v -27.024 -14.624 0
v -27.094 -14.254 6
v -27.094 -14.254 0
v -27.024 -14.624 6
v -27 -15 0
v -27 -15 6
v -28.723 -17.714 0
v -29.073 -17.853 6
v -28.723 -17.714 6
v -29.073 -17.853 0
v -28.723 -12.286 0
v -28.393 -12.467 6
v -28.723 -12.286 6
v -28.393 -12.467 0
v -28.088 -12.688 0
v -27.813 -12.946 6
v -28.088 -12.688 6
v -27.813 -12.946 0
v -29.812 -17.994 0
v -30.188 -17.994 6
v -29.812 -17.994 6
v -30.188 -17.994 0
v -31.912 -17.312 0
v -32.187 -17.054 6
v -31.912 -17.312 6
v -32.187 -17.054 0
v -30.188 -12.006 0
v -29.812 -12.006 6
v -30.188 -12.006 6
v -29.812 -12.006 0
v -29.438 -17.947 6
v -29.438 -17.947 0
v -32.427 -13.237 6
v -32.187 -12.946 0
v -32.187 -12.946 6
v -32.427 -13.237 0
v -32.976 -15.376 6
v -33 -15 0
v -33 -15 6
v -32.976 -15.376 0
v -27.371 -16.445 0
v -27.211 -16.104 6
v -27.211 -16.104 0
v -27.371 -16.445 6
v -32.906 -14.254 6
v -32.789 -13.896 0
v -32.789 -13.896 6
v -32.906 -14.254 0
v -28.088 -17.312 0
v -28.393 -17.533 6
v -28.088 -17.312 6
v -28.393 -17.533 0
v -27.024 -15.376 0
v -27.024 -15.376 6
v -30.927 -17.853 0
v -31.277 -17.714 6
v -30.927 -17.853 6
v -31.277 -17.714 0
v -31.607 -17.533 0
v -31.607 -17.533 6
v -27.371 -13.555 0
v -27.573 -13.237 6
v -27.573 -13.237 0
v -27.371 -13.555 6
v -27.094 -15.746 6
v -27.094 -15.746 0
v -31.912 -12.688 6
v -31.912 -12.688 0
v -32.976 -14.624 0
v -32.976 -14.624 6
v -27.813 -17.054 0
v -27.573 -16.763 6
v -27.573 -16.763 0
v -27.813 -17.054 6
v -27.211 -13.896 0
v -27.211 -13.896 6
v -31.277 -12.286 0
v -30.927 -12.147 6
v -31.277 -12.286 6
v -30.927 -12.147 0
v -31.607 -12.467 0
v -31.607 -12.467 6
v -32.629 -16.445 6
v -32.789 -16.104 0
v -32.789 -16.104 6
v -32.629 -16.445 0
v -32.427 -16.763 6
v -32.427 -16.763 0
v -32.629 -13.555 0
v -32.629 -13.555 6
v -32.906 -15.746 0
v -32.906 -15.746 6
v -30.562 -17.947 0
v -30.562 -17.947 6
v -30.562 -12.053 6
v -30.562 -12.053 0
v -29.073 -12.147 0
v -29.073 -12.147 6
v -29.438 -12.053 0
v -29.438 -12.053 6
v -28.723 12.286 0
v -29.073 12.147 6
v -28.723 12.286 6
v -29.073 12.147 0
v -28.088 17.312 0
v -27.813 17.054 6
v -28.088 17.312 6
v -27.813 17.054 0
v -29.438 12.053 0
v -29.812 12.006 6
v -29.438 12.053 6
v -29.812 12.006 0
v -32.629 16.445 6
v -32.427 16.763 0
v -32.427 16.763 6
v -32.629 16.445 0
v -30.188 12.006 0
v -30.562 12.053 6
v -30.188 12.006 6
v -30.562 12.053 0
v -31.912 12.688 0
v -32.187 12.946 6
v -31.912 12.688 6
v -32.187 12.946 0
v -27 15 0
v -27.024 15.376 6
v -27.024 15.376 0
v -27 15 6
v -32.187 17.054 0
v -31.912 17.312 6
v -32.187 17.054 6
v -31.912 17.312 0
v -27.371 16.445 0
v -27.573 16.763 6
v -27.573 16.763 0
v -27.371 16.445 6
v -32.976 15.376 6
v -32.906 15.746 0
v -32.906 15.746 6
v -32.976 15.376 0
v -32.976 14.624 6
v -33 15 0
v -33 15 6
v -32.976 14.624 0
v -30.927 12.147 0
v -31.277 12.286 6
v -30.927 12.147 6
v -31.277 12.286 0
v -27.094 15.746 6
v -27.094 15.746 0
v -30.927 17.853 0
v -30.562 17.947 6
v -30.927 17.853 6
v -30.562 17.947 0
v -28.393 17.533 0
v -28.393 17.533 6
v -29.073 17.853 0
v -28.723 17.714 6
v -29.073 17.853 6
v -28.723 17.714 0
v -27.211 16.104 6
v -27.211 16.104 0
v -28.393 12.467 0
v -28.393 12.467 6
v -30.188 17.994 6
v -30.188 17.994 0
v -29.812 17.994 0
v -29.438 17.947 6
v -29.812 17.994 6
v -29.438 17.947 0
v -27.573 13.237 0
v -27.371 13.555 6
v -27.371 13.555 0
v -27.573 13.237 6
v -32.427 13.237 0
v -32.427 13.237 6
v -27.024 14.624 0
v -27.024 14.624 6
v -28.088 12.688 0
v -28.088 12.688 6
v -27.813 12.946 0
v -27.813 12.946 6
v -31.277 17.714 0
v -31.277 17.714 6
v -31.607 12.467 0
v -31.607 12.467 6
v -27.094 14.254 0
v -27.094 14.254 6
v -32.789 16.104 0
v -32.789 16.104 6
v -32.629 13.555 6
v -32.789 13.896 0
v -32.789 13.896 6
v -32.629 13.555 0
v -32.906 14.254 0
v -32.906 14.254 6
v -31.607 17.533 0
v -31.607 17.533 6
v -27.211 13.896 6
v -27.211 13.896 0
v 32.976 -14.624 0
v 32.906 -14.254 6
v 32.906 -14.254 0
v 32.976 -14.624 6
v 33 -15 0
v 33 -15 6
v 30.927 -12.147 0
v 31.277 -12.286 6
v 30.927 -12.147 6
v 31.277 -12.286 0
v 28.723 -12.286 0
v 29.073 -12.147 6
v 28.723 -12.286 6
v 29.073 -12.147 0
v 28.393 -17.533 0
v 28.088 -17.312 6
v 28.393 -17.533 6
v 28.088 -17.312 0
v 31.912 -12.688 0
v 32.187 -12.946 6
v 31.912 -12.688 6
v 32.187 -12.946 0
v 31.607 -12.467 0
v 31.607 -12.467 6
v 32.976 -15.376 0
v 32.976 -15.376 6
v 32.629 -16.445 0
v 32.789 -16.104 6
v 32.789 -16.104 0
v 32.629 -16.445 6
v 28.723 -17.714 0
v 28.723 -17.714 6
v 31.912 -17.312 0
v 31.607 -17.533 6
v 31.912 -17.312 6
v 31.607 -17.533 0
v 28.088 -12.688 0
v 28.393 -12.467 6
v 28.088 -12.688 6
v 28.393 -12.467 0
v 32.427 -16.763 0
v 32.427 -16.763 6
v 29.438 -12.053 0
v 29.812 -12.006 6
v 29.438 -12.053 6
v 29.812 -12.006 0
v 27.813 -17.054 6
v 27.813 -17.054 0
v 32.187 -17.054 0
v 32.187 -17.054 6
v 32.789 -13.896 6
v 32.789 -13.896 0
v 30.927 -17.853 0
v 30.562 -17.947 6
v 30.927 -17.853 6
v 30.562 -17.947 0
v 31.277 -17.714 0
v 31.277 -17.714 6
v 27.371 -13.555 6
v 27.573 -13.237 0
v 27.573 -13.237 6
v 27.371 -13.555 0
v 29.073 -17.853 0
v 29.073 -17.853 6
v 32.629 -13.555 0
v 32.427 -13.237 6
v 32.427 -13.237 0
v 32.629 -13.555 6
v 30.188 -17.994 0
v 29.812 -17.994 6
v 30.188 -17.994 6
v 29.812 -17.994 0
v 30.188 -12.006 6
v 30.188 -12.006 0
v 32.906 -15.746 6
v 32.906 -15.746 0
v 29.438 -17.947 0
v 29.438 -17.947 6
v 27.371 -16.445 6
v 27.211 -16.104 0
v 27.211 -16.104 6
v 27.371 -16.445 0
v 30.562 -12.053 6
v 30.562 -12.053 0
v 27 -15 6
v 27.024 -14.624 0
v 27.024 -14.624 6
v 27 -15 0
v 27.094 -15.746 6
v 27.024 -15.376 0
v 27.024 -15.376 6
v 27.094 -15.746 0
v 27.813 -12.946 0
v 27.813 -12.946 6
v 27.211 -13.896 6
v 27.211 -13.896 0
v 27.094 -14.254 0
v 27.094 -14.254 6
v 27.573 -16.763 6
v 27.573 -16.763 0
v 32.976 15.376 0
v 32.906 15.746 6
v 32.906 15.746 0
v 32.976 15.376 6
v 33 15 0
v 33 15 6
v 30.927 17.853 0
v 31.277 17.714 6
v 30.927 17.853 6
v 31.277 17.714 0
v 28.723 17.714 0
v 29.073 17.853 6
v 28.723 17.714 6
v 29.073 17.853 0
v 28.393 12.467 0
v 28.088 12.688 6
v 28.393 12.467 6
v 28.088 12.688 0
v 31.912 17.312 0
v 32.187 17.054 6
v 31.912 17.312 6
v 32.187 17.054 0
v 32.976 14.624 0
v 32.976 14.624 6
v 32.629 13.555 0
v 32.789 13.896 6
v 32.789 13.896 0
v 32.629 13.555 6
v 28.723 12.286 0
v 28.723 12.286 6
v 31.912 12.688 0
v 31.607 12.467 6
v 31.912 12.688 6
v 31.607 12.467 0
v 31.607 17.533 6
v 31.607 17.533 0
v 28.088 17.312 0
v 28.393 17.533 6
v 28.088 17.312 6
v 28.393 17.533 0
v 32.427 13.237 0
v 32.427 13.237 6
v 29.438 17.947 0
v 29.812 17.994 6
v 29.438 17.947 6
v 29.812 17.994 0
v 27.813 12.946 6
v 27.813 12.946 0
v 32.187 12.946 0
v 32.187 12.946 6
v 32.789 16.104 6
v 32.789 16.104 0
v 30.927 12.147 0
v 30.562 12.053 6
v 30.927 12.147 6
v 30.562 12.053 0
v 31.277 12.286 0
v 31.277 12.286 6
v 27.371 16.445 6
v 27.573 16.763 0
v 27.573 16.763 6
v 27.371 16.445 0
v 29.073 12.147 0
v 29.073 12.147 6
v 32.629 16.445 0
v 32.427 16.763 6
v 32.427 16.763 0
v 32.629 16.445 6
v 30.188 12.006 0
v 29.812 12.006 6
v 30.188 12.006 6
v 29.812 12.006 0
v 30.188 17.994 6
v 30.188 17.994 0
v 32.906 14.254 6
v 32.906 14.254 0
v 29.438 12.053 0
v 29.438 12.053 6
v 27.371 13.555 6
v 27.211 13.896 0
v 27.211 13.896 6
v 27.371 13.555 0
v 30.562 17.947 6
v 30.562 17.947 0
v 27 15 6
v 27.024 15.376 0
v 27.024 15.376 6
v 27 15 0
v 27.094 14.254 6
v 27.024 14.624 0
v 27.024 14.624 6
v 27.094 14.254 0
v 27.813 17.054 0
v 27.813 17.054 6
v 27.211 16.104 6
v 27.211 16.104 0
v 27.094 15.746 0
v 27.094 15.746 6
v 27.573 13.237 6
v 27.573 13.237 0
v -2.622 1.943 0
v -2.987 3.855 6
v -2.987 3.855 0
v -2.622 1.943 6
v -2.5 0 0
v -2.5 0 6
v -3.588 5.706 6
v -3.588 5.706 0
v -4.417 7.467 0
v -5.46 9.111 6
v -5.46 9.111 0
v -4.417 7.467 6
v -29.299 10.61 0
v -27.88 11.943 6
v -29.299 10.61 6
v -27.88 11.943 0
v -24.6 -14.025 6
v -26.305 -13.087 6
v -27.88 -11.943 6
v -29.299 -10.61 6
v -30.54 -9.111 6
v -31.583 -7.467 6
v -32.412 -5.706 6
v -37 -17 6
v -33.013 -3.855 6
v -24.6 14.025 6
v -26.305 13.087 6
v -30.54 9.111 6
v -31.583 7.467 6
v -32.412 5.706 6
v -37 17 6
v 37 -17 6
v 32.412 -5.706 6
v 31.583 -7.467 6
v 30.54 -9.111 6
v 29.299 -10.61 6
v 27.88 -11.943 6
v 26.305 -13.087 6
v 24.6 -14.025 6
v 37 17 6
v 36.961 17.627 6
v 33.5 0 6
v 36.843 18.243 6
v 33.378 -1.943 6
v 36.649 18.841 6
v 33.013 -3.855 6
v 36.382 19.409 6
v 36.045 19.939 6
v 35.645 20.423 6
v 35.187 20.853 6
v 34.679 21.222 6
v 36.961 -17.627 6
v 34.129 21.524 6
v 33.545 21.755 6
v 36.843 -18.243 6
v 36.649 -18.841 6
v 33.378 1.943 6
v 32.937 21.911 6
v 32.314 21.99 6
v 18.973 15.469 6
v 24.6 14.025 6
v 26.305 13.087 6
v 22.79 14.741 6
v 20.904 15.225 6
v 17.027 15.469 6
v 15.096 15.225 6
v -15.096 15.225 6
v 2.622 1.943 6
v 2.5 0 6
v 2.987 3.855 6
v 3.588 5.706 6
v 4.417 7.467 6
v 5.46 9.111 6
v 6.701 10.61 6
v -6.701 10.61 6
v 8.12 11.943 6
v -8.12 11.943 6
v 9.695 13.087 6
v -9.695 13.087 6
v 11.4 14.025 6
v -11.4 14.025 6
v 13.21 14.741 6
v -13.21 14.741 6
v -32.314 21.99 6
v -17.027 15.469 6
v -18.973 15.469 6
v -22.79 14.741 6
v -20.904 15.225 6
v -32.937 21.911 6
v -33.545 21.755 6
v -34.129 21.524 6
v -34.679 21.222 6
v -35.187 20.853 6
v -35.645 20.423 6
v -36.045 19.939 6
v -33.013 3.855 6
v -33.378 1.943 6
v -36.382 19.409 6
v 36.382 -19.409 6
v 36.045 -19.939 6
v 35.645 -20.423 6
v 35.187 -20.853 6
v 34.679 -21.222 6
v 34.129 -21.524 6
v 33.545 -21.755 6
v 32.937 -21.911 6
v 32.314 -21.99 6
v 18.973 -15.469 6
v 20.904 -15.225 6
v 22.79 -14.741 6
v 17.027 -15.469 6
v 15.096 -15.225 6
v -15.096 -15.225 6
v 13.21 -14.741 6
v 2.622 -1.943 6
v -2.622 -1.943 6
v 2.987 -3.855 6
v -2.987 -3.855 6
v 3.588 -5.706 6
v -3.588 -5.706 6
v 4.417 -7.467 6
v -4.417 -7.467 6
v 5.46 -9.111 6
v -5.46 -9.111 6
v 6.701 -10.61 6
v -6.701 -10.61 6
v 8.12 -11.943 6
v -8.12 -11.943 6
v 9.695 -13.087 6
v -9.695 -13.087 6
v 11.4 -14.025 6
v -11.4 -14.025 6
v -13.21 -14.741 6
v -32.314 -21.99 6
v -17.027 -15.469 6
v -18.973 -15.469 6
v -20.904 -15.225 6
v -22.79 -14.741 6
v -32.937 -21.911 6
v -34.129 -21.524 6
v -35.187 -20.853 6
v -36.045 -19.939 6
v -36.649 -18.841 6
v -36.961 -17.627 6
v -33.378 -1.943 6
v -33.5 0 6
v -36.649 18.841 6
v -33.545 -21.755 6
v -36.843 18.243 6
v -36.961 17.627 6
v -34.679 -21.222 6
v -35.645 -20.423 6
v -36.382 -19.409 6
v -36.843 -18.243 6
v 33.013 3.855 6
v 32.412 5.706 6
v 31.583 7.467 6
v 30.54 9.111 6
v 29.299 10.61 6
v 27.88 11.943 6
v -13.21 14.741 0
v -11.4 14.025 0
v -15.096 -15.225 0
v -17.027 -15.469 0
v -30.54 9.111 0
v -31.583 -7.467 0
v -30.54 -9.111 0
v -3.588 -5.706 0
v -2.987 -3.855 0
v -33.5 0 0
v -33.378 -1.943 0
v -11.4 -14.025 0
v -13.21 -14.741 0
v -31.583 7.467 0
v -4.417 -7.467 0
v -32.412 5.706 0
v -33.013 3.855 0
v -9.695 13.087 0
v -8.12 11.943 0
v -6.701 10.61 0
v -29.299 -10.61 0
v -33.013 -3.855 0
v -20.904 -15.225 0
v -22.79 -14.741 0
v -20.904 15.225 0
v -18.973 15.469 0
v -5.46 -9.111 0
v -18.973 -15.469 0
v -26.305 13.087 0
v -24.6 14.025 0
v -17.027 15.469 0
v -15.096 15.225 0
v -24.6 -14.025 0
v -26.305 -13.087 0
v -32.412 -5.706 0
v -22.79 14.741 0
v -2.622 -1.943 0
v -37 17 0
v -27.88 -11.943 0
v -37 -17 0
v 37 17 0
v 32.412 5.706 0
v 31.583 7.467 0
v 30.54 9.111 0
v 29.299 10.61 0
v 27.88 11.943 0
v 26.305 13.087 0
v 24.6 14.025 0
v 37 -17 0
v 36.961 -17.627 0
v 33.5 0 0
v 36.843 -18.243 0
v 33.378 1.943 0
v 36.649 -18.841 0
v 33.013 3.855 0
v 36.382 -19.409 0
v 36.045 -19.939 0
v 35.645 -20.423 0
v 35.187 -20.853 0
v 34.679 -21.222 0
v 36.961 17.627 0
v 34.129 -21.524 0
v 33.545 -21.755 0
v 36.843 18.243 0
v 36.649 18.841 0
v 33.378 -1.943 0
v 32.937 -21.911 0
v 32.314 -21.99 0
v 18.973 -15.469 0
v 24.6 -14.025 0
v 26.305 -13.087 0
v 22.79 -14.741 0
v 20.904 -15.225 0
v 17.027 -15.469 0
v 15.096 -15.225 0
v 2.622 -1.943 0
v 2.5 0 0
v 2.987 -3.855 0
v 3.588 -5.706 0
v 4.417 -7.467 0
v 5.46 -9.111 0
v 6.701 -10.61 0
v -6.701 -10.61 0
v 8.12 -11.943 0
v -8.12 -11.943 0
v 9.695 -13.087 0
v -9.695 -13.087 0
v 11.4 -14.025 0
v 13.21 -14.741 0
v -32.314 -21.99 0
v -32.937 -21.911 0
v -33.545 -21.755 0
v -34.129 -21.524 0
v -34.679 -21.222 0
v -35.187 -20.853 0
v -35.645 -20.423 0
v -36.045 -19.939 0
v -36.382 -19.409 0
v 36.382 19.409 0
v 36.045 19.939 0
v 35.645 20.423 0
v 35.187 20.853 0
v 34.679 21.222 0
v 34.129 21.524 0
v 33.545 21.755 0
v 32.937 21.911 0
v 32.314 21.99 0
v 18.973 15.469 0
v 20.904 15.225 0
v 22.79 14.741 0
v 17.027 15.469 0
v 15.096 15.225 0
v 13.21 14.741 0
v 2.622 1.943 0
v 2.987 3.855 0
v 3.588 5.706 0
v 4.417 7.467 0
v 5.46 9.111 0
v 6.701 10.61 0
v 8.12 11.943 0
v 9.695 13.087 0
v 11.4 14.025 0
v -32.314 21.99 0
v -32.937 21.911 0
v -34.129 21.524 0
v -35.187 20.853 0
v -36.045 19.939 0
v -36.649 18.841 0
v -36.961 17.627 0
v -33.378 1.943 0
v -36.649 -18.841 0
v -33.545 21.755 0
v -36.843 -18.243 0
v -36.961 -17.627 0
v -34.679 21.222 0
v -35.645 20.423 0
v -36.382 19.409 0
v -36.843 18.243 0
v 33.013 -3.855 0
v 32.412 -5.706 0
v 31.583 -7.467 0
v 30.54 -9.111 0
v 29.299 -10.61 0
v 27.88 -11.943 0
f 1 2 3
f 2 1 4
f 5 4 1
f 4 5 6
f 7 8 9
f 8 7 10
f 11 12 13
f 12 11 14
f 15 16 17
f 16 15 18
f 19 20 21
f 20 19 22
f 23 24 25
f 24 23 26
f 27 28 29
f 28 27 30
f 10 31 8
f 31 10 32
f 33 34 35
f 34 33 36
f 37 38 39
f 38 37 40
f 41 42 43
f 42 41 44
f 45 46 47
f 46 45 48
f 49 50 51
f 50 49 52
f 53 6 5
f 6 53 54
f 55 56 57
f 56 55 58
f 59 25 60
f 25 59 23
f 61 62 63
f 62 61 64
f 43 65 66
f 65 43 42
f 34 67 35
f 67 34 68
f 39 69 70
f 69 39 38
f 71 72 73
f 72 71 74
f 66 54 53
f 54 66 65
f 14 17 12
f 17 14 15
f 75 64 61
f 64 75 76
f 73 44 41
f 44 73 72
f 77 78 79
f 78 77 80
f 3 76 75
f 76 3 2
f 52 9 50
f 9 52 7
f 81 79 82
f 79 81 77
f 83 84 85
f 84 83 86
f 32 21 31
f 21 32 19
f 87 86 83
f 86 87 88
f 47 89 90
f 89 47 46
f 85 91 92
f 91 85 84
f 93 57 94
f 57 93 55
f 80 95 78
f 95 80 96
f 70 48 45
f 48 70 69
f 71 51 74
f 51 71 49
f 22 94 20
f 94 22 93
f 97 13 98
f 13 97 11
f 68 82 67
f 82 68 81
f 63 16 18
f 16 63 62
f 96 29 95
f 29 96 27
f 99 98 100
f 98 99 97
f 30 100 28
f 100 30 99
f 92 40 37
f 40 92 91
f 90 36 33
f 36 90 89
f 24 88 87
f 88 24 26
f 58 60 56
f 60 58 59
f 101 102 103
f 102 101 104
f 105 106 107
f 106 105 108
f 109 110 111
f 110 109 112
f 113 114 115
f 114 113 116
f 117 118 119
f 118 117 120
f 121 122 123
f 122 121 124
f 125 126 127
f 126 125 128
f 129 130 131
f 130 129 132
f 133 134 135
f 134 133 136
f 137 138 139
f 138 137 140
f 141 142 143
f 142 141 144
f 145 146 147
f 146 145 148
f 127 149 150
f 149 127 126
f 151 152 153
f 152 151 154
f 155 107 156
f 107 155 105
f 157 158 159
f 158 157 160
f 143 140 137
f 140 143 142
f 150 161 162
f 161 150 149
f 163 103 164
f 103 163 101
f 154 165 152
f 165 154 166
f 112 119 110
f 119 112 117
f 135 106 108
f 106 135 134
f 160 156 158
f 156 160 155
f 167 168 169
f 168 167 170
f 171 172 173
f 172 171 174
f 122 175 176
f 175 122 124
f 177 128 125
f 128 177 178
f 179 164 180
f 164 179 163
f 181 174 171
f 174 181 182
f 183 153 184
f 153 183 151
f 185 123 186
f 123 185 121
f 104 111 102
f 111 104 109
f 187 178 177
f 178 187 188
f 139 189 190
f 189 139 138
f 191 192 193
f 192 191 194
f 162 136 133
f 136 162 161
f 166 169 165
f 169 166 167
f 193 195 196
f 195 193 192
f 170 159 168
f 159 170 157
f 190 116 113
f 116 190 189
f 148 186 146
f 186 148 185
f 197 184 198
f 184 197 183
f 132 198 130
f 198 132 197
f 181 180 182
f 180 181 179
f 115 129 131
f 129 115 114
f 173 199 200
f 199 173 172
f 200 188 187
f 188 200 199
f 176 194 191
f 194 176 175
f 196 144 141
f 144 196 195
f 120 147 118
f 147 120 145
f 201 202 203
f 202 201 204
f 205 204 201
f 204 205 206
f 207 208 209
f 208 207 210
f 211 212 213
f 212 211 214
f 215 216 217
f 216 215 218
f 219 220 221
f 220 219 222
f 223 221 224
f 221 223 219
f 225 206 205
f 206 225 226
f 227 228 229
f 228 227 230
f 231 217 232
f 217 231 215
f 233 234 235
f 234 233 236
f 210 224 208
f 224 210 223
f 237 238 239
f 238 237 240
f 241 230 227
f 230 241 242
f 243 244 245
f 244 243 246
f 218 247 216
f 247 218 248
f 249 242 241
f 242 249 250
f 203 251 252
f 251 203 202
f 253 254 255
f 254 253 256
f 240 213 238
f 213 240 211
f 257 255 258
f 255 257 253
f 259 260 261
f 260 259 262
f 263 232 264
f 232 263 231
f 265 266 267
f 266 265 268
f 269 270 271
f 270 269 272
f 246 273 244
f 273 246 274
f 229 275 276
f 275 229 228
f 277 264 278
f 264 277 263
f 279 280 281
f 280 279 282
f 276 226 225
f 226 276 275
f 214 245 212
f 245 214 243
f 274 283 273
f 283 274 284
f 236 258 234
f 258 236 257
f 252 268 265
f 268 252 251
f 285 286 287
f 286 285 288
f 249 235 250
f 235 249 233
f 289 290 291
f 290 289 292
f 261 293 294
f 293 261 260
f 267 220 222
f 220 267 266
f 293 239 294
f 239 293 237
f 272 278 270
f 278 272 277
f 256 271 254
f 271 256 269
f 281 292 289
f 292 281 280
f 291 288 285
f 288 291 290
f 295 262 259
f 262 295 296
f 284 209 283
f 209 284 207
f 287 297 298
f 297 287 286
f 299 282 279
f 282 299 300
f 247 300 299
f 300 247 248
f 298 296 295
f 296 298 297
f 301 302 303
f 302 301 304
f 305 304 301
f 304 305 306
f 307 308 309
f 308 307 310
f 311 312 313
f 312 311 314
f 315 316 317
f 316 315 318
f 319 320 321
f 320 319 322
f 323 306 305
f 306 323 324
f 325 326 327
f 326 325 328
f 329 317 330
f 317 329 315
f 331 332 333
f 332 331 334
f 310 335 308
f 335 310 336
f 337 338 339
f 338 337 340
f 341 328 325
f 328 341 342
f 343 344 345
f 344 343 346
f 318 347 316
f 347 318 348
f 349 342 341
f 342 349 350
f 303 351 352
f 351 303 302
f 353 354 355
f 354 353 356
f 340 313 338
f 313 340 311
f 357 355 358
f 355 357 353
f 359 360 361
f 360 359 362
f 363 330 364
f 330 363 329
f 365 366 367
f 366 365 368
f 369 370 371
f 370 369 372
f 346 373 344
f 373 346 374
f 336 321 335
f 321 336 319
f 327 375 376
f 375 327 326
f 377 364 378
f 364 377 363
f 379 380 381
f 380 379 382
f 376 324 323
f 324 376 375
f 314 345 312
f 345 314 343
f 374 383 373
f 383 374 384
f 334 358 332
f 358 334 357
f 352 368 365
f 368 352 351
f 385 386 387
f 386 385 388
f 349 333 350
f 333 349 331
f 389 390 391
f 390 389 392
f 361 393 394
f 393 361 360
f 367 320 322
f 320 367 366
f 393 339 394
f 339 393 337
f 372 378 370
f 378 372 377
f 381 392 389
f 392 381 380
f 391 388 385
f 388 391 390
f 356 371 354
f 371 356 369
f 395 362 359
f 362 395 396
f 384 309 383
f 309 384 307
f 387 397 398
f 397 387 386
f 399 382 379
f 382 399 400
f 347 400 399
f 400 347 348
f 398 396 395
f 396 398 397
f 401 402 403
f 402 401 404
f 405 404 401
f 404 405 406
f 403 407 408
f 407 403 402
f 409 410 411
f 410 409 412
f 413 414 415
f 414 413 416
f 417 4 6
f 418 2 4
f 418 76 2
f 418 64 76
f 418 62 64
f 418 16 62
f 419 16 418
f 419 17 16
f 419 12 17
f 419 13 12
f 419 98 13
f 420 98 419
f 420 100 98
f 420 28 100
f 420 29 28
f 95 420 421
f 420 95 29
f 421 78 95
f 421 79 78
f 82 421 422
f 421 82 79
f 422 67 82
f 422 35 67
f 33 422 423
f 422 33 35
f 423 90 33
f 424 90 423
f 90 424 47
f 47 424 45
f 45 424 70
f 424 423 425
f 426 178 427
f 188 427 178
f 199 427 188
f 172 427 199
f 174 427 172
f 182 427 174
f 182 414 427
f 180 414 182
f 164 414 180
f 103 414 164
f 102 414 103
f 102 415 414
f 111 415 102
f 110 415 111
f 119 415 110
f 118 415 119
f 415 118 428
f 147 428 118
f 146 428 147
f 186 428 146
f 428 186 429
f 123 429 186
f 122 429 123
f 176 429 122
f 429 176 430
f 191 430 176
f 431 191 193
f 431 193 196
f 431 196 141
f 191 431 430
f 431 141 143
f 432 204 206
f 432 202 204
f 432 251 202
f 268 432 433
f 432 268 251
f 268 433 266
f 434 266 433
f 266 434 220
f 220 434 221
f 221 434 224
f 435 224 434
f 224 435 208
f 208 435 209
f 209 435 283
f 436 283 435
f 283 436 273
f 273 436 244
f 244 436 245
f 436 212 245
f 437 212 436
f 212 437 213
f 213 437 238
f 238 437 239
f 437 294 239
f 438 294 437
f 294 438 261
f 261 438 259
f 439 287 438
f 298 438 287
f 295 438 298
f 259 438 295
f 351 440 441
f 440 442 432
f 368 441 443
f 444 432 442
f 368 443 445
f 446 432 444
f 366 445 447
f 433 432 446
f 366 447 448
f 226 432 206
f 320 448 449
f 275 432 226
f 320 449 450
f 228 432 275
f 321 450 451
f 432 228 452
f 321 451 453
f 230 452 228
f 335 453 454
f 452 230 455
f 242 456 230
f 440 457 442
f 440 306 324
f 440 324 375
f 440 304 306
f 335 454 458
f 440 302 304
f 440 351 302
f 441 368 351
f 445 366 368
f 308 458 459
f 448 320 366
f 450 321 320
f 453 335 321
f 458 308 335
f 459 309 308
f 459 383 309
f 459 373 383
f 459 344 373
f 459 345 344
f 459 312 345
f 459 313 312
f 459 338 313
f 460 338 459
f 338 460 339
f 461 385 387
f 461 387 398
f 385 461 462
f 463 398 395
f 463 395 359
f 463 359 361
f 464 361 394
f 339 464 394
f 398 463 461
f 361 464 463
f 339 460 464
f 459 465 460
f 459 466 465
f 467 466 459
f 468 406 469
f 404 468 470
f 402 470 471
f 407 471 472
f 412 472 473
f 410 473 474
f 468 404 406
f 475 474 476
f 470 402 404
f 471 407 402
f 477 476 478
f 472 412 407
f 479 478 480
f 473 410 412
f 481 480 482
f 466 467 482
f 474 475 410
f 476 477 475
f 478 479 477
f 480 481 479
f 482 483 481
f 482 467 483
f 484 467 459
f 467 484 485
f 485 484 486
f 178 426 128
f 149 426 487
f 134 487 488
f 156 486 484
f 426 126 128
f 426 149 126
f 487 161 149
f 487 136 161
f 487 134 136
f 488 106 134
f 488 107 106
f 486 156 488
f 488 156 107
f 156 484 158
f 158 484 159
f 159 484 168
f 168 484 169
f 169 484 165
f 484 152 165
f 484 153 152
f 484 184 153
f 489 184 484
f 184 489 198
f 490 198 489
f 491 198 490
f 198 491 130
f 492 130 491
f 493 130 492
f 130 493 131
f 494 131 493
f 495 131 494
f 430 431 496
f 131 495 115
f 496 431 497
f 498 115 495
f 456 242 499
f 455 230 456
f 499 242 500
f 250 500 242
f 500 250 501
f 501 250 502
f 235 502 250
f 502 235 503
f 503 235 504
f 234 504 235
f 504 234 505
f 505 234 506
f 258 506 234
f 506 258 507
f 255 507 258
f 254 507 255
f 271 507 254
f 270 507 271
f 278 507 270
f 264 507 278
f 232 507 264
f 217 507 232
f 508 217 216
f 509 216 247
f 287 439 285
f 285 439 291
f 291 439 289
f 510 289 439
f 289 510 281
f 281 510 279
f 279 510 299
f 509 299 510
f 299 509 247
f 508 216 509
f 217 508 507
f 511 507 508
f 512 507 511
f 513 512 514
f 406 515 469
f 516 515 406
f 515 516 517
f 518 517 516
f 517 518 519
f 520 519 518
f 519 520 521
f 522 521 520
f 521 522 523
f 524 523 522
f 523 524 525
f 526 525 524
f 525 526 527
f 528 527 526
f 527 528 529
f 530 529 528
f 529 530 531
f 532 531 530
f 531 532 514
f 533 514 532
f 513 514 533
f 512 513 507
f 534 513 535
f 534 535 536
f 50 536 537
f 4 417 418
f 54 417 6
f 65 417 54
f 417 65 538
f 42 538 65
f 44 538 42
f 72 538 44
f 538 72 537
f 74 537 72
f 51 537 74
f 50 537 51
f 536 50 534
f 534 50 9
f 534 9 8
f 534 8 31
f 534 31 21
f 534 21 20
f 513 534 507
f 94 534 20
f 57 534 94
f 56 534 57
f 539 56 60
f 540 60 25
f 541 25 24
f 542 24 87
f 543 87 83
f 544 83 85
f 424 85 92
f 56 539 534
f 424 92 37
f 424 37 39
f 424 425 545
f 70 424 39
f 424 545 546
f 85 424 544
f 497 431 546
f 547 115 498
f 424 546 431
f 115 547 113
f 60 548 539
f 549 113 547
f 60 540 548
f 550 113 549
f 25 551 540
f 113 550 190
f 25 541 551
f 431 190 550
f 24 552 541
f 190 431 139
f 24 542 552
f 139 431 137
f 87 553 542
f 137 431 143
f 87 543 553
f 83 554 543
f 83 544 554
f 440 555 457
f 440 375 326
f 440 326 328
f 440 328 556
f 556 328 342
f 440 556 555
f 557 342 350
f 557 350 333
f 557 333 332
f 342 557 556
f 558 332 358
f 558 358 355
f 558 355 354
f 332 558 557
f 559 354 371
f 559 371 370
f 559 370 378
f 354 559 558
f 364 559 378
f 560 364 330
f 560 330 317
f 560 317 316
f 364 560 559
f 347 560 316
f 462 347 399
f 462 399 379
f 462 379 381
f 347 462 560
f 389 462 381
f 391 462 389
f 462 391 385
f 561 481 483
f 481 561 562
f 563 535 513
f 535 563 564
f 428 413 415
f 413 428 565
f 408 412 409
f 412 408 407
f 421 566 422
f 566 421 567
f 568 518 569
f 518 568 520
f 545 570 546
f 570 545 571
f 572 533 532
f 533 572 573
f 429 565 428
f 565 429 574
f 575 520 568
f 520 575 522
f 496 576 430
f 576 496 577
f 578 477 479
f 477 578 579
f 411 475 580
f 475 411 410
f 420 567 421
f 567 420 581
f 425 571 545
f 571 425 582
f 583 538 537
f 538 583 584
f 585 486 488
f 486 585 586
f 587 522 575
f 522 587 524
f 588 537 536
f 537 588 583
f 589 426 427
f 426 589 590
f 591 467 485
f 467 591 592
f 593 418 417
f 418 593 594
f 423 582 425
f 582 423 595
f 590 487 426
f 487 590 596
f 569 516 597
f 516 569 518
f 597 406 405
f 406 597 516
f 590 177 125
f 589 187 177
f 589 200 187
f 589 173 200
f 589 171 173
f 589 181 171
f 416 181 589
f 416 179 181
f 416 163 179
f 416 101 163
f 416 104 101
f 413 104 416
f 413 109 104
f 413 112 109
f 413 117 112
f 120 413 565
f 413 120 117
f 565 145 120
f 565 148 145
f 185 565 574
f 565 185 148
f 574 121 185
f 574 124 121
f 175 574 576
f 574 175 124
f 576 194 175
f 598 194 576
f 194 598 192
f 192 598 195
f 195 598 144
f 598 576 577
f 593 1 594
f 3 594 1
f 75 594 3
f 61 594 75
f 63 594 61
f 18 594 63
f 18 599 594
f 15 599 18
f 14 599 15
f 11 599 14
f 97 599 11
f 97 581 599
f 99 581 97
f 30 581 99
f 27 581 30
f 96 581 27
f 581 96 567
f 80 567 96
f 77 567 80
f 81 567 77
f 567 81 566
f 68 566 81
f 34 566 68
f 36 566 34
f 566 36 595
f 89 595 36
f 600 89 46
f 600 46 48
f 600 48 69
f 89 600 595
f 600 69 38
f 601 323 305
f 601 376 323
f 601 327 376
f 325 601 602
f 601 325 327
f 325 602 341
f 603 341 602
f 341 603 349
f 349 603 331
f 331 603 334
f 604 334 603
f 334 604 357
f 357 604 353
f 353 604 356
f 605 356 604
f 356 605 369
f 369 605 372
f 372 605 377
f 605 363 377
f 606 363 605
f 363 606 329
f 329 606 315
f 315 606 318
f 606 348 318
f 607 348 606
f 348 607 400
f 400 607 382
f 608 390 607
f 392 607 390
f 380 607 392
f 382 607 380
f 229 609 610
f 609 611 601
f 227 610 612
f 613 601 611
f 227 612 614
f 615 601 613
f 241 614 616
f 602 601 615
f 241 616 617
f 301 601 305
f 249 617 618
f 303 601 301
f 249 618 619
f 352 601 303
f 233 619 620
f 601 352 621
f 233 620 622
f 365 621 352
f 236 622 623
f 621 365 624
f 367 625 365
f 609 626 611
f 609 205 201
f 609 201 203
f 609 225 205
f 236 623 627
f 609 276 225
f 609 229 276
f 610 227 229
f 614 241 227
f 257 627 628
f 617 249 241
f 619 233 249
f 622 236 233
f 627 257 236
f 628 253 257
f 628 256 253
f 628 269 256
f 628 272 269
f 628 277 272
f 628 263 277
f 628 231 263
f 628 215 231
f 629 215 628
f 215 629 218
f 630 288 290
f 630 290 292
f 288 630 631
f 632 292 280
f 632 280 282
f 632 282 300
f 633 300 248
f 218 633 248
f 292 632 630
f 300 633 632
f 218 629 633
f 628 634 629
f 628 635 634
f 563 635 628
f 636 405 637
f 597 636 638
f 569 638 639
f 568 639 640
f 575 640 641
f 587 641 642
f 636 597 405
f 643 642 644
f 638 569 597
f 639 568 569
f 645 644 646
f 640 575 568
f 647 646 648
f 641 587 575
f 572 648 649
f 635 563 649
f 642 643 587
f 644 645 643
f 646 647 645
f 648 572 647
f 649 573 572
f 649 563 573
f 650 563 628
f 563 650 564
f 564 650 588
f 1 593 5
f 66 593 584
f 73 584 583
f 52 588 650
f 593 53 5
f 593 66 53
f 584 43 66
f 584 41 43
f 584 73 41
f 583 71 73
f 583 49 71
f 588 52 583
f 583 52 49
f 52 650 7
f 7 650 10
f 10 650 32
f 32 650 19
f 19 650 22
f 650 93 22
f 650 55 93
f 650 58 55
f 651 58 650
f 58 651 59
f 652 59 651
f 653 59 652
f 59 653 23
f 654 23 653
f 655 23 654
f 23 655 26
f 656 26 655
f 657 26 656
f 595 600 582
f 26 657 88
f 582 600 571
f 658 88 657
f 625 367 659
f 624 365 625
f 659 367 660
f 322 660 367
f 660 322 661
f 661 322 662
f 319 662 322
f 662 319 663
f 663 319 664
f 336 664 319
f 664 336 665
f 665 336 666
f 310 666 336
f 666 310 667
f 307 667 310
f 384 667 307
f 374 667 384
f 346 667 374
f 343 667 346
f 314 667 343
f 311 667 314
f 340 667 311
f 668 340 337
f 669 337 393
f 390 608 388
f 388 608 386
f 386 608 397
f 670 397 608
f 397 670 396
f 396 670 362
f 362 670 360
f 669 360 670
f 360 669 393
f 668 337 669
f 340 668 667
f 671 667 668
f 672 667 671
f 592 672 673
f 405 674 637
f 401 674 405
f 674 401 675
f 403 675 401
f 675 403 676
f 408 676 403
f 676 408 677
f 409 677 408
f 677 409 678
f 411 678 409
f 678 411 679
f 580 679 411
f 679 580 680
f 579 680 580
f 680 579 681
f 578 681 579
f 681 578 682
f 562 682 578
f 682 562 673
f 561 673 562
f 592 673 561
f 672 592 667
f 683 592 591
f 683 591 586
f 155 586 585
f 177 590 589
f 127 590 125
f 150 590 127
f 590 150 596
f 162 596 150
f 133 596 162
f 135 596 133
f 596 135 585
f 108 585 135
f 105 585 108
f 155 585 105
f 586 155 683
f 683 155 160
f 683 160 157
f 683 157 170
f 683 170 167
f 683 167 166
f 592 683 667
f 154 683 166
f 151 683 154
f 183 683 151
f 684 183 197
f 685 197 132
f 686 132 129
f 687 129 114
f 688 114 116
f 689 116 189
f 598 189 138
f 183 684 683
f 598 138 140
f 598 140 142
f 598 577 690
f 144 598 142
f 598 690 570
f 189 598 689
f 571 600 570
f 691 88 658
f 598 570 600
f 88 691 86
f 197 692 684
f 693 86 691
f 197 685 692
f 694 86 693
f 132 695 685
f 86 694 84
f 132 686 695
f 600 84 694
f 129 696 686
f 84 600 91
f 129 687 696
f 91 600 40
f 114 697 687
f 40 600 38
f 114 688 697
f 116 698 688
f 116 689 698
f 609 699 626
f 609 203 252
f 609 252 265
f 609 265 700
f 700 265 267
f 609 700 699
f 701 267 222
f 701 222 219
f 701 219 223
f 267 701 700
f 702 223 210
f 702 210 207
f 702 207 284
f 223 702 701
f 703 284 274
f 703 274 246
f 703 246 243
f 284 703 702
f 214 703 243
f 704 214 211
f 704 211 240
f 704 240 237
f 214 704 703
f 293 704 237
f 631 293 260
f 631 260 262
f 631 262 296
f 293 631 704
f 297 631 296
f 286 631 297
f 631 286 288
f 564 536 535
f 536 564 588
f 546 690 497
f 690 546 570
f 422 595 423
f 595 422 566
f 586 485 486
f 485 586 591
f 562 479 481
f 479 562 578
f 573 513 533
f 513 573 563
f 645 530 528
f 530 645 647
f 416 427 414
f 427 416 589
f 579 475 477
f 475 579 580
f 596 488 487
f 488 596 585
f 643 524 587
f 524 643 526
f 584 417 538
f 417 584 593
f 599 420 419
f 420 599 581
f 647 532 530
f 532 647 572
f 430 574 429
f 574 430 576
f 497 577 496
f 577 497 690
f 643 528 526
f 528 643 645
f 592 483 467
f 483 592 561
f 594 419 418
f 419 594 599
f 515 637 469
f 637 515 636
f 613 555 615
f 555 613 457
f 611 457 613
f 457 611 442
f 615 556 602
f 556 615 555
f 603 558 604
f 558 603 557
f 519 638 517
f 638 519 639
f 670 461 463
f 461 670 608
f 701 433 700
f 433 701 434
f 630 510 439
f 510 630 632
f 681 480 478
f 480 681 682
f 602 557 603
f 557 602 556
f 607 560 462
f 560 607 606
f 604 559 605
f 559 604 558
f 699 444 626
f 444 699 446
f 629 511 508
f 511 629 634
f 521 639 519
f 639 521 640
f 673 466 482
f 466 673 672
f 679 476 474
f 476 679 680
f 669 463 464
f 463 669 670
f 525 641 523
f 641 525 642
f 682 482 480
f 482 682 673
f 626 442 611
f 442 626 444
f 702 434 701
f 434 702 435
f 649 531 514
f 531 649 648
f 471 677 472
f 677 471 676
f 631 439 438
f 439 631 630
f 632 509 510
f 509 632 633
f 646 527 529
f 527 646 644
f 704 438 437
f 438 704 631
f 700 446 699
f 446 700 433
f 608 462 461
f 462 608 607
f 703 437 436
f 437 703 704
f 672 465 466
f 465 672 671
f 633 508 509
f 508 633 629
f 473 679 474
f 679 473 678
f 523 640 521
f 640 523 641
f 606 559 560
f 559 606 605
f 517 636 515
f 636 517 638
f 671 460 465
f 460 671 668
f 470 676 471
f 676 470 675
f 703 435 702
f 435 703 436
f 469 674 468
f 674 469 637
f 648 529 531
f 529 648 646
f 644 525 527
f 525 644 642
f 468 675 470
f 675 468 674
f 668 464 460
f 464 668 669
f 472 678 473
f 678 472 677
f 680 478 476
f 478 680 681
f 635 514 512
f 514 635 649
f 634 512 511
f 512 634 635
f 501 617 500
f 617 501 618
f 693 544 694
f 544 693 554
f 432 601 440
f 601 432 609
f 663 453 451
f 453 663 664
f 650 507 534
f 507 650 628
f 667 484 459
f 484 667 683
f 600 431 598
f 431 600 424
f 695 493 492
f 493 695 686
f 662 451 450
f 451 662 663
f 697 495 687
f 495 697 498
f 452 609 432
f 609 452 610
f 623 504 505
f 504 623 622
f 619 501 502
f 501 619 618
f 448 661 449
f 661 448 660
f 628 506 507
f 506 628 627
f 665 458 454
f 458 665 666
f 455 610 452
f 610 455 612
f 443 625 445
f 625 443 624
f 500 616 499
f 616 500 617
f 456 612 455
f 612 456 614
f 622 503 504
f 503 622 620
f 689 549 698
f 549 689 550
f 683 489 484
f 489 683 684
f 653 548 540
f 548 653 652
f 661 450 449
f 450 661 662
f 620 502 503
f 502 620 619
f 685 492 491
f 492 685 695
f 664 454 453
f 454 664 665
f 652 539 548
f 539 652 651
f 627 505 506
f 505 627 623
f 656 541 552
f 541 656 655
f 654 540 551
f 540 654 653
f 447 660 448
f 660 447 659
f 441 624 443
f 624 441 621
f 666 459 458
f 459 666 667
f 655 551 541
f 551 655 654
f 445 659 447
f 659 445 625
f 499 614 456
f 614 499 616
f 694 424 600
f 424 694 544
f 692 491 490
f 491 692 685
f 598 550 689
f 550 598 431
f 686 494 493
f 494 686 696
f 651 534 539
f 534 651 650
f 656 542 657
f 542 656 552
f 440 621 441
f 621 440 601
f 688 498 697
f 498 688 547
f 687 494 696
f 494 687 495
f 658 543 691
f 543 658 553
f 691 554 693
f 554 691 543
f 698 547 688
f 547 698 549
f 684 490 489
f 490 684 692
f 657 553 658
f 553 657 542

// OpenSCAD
$fn = 50;


difference() {
	union() {
		hull() {
			translate(v = [-32.0000000000, 17.0000000000, 0]) {
				cylinder(h = 6, r = 5);
			}
			translate(v = [32.0000000000, 17.0000000000, 0]) {
				cylinder(h = 6, r = 5);
			}
			translate(v = [-32.0000000000, -17.0000000000, 0]) {
				cylinder(h = 6, r = 5);
			}
			translate(v = [32.0000000000, -17.0000000000, 0]) {
				cylinder(h = 6, r = 5);
			}
		}
	}
	union() {
		#translate(v = [-30.0000000000, -15.0000000000, -100.0000000000]) {
			cylinder(h = 200, r = 3.0000000000);
		}
		#translate(v = [-30.0000000000, 15.0000000000, -100.0000000000]) {
			cylinder(h = 200, r = 3.0000000000);
		}
		#translate(v = [30.0000000000, -15.0000000000, -100.0000000000]) {
			cylinder(h = 200, r = 3.0000000000);
		}
		#translate(v = [30.0000000000, 15.0000000000, -100.0000000000]) {
			cylinder(h = 200, r = 3.0000000000);
		}
		#translate(v = [-18.0000000000, 0, 0]) {
			cylinder(h = 6, r = 15.5000000000);
		}
		#translate(v = [18.0000000000, 0, 0]) {
			cylinder(h = 6, r = 15.5000000000);
		}
	}
}
